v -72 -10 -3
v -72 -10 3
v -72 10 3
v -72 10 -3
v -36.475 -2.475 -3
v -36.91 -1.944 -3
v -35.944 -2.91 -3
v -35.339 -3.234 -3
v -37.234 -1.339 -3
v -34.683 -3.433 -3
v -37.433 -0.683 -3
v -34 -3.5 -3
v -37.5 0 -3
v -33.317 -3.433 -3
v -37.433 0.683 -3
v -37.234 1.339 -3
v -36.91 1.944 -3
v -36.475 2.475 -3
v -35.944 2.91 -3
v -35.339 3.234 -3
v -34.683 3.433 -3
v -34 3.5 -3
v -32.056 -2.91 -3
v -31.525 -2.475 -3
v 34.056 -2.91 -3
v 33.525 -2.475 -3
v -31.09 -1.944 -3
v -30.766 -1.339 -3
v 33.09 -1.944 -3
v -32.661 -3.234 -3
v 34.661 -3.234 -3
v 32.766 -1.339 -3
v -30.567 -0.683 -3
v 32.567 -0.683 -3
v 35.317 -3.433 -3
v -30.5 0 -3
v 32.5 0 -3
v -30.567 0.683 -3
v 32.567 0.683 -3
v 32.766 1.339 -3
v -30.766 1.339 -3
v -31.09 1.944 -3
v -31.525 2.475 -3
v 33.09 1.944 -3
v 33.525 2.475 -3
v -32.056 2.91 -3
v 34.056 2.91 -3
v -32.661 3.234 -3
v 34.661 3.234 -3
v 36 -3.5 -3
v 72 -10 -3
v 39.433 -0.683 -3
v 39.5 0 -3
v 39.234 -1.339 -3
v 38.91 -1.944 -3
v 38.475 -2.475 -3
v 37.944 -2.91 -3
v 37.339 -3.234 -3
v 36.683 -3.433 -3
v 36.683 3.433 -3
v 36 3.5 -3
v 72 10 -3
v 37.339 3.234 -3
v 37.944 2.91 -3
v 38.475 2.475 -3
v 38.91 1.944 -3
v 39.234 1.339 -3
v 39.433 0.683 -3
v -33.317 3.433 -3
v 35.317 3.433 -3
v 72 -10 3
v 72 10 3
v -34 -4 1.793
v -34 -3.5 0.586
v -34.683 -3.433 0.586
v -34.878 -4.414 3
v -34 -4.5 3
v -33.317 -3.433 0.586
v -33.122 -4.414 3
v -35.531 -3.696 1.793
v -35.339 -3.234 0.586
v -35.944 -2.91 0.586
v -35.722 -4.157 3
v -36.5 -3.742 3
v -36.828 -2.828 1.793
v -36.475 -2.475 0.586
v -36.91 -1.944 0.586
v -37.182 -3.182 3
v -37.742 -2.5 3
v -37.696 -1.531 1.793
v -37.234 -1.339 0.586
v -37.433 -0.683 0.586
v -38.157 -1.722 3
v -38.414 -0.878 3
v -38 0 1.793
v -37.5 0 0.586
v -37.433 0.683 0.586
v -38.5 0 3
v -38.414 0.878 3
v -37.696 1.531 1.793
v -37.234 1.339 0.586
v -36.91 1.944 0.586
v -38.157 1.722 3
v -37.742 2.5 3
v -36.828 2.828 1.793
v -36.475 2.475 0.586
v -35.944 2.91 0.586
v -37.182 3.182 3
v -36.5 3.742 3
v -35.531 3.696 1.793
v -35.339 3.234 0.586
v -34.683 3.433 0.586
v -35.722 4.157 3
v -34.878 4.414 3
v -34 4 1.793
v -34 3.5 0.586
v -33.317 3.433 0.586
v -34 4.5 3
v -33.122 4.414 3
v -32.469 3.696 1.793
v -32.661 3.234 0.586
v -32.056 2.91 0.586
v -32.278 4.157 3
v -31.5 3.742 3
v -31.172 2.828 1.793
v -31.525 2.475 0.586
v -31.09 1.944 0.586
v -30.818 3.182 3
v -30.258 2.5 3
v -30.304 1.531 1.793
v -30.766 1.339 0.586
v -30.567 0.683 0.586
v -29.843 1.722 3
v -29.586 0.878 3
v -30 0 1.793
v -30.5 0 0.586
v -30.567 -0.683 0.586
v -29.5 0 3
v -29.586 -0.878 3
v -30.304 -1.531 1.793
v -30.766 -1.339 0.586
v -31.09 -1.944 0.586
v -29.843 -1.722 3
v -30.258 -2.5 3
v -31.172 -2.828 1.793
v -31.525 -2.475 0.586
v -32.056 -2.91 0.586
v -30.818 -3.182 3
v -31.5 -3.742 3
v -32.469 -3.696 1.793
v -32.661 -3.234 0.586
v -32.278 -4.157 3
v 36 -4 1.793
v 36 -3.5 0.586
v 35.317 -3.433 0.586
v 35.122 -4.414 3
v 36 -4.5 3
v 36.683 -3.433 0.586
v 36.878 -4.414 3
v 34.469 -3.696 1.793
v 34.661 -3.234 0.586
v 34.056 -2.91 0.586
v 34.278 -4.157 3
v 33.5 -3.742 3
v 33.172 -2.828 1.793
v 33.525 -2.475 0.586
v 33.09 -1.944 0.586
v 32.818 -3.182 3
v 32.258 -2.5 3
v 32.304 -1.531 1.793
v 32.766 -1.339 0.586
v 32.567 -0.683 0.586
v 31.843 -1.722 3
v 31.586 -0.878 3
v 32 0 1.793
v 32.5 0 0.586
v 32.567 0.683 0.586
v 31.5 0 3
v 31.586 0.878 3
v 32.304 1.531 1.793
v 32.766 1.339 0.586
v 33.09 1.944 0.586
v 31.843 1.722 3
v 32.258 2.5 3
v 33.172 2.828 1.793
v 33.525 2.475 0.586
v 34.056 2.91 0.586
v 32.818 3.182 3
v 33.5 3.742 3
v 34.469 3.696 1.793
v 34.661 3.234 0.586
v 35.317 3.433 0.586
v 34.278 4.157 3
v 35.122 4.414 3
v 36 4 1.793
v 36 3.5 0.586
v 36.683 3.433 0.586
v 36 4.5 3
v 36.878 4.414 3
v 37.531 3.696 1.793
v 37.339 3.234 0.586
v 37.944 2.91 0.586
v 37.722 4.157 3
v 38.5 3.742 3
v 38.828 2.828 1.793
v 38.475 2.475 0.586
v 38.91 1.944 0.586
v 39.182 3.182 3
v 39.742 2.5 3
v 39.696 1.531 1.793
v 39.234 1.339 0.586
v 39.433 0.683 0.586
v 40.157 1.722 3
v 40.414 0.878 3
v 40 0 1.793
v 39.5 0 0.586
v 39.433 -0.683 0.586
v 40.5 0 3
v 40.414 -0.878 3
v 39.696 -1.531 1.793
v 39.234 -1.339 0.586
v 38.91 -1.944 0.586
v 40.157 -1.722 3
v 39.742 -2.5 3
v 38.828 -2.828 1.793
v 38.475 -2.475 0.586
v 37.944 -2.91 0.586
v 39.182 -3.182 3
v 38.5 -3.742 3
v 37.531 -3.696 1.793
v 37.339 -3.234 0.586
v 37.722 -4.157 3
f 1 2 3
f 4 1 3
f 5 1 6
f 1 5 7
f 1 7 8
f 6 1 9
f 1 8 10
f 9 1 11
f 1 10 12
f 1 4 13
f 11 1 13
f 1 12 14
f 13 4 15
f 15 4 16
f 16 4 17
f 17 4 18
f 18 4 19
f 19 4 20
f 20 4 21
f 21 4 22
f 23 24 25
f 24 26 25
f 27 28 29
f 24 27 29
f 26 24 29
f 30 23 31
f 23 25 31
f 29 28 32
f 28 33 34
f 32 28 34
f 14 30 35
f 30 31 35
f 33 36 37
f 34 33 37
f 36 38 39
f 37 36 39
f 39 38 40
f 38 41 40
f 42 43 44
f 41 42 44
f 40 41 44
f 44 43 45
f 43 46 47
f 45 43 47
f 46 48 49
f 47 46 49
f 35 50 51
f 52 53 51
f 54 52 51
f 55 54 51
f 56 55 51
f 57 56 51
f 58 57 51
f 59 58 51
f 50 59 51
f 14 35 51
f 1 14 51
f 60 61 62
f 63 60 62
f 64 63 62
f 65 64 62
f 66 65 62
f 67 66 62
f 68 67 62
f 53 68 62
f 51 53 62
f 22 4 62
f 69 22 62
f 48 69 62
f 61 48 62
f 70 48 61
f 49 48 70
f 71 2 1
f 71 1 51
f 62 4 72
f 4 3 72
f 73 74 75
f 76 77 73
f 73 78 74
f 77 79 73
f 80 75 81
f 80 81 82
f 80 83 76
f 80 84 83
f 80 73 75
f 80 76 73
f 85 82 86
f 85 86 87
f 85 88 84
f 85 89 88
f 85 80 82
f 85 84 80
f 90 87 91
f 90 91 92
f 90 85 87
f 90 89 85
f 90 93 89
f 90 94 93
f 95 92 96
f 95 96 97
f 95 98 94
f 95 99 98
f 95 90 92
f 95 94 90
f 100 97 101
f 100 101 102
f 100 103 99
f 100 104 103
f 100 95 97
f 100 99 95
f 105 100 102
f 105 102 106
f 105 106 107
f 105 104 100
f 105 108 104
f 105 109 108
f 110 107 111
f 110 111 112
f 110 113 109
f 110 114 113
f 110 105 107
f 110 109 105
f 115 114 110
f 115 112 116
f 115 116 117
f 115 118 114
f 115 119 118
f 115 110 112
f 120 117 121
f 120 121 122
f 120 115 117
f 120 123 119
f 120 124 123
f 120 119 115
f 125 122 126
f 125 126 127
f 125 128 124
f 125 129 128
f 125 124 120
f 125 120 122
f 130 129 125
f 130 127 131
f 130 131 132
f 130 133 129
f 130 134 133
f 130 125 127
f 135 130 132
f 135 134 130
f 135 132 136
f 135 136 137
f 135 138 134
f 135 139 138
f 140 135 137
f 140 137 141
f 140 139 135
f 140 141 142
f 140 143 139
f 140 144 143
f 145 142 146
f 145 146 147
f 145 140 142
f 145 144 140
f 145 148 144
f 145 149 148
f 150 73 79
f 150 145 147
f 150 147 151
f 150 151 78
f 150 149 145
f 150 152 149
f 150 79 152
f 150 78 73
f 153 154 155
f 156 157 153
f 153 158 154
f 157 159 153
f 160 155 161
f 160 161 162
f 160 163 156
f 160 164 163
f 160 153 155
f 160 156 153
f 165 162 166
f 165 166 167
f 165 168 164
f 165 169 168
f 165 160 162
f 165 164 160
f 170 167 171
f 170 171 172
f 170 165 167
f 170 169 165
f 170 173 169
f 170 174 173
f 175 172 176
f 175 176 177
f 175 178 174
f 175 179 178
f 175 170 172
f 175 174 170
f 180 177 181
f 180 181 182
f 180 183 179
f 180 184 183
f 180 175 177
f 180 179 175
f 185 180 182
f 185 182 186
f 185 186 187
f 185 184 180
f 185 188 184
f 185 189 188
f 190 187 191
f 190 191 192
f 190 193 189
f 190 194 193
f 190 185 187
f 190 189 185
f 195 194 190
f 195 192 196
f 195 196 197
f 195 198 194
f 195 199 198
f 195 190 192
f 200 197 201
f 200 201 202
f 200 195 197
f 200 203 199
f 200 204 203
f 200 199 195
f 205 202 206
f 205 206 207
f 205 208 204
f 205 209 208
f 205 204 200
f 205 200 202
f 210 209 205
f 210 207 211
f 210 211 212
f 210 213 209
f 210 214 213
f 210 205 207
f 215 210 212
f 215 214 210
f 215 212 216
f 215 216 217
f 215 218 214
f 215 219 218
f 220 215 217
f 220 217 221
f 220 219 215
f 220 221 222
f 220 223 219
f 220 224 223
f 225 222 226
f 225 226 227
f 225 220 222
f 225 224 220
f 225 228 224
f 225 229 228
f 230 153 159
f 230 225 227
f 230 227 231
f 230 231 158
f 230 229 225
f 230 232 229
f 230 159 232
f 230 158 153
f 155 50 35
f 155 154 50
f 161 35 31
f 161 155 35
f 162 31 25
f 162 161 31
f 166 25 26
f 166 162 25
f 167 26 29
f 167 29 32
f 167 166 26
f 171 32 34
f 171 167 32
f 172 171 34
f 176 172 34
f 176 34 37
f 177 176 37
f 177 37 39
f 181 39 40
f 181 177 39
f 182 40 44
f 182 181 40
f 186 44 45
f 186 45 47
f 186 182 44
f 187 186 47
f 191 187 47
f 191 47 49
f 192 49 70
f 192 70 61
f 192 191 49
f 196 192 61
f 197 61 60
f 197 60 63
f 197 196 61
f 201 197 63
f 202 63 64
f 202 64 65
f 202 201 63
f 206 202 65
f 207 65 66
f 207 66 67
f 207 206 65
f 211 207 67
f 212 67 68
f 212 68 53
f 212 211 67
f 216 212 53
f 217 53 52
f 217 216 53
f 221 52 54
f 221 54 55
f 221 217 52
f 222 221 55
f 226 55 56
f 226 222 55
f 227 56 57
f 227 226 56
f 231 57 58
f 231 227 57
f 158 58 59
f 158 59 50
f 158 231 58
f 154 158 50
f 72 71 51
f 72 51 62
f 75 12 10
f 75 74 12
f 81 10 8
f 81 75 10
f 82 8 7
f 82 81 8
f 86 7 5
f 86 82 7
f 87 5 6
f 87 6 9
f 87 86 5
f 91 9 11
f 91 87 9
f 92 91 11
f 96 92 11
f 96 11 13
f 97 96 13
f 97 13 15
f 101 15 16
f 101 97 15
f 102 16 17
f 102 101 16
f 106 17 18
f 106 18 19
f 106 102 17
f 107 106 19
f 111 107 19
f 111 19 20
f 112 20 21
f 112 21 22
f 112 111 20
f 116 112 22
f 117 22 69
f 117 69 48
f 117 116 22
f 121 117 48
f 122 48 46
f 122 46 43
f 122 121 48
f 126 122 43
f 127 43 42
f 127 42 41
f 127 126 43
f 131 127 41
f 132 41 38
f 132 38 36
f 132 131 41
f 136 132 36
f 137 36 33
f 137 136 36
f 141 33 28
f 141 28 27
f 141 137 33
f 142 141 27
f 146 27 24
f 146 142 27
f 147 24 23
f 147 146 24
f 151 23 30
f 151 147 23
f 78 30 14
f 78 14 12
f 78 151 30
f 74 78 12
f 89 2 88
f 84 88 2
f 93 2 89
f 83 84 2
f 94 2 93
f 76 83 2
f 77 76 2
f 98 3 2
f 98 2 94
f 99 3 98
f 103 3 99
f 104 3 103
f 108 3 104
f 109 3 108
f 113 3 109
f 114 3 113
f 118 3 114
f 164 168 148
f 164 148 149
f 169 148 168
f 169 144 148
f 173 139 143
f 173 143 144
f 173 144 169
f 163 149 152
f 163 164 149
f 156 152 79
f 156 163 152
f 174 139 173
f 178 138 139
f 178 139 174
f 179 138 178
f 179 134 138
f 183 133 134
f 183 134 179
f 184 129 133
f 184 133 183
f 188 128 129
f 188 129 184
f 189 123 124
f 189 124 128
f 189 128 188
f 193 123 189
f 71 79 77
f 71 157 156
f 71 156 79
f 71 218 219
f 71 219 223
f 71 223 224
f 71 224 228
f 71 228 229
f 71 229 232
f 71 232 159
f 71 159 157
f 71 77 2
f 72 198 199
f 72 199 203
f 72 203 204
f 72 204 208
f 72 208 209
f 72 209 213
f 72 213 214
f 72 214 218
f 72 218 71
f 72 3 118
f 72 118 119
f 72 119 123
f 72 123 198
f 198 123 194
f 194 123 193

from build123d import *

# Parameters (mm, degrees)
SKETCH1_W           = 144
SKETCH1_H           = 20
BOSS_EXTRUDE1_DEPTH = 3
LPATTERN1_COUNT     = 2
LPATTERN1_PITCH     = 70


with BuildPart() as part:
    # Sketch1 → Boss-Extrude1 (new body, symmetric)
    with BuildSketch(Plane.XY):
        Rectangle(SKETCH1_W, SKETCH1_H)
    extrude(amount=BOSS_EXTRUDE1_DEPTH, both=True)

    # Sketch6 → Hole1 (revolve, cut)
    with BuildSketch(Plane(origin=(-34, 0, 3), x_dir=(0, -1, 0), z_dir=(1, 0, 0))):
        Polygon((0, 0), (0, 6), (3.5, 6), (3.5, 2.414213562), (4.5, 0), align=None)
    hole1 = revolve(axis=Axis((-34, 0, 9.445314094), (0, 0, -1)), mode=Mode.SUBTRACT)

    # LPattern1: Hole1 ×2
    with Locations(*[(i * LPATTERN1_PITCH, 0, 0) for i in range(1, LPATTERN1_COUNT)]):
        add(hole1, mode=Mode.SUBTRACT)


solid = part.part
